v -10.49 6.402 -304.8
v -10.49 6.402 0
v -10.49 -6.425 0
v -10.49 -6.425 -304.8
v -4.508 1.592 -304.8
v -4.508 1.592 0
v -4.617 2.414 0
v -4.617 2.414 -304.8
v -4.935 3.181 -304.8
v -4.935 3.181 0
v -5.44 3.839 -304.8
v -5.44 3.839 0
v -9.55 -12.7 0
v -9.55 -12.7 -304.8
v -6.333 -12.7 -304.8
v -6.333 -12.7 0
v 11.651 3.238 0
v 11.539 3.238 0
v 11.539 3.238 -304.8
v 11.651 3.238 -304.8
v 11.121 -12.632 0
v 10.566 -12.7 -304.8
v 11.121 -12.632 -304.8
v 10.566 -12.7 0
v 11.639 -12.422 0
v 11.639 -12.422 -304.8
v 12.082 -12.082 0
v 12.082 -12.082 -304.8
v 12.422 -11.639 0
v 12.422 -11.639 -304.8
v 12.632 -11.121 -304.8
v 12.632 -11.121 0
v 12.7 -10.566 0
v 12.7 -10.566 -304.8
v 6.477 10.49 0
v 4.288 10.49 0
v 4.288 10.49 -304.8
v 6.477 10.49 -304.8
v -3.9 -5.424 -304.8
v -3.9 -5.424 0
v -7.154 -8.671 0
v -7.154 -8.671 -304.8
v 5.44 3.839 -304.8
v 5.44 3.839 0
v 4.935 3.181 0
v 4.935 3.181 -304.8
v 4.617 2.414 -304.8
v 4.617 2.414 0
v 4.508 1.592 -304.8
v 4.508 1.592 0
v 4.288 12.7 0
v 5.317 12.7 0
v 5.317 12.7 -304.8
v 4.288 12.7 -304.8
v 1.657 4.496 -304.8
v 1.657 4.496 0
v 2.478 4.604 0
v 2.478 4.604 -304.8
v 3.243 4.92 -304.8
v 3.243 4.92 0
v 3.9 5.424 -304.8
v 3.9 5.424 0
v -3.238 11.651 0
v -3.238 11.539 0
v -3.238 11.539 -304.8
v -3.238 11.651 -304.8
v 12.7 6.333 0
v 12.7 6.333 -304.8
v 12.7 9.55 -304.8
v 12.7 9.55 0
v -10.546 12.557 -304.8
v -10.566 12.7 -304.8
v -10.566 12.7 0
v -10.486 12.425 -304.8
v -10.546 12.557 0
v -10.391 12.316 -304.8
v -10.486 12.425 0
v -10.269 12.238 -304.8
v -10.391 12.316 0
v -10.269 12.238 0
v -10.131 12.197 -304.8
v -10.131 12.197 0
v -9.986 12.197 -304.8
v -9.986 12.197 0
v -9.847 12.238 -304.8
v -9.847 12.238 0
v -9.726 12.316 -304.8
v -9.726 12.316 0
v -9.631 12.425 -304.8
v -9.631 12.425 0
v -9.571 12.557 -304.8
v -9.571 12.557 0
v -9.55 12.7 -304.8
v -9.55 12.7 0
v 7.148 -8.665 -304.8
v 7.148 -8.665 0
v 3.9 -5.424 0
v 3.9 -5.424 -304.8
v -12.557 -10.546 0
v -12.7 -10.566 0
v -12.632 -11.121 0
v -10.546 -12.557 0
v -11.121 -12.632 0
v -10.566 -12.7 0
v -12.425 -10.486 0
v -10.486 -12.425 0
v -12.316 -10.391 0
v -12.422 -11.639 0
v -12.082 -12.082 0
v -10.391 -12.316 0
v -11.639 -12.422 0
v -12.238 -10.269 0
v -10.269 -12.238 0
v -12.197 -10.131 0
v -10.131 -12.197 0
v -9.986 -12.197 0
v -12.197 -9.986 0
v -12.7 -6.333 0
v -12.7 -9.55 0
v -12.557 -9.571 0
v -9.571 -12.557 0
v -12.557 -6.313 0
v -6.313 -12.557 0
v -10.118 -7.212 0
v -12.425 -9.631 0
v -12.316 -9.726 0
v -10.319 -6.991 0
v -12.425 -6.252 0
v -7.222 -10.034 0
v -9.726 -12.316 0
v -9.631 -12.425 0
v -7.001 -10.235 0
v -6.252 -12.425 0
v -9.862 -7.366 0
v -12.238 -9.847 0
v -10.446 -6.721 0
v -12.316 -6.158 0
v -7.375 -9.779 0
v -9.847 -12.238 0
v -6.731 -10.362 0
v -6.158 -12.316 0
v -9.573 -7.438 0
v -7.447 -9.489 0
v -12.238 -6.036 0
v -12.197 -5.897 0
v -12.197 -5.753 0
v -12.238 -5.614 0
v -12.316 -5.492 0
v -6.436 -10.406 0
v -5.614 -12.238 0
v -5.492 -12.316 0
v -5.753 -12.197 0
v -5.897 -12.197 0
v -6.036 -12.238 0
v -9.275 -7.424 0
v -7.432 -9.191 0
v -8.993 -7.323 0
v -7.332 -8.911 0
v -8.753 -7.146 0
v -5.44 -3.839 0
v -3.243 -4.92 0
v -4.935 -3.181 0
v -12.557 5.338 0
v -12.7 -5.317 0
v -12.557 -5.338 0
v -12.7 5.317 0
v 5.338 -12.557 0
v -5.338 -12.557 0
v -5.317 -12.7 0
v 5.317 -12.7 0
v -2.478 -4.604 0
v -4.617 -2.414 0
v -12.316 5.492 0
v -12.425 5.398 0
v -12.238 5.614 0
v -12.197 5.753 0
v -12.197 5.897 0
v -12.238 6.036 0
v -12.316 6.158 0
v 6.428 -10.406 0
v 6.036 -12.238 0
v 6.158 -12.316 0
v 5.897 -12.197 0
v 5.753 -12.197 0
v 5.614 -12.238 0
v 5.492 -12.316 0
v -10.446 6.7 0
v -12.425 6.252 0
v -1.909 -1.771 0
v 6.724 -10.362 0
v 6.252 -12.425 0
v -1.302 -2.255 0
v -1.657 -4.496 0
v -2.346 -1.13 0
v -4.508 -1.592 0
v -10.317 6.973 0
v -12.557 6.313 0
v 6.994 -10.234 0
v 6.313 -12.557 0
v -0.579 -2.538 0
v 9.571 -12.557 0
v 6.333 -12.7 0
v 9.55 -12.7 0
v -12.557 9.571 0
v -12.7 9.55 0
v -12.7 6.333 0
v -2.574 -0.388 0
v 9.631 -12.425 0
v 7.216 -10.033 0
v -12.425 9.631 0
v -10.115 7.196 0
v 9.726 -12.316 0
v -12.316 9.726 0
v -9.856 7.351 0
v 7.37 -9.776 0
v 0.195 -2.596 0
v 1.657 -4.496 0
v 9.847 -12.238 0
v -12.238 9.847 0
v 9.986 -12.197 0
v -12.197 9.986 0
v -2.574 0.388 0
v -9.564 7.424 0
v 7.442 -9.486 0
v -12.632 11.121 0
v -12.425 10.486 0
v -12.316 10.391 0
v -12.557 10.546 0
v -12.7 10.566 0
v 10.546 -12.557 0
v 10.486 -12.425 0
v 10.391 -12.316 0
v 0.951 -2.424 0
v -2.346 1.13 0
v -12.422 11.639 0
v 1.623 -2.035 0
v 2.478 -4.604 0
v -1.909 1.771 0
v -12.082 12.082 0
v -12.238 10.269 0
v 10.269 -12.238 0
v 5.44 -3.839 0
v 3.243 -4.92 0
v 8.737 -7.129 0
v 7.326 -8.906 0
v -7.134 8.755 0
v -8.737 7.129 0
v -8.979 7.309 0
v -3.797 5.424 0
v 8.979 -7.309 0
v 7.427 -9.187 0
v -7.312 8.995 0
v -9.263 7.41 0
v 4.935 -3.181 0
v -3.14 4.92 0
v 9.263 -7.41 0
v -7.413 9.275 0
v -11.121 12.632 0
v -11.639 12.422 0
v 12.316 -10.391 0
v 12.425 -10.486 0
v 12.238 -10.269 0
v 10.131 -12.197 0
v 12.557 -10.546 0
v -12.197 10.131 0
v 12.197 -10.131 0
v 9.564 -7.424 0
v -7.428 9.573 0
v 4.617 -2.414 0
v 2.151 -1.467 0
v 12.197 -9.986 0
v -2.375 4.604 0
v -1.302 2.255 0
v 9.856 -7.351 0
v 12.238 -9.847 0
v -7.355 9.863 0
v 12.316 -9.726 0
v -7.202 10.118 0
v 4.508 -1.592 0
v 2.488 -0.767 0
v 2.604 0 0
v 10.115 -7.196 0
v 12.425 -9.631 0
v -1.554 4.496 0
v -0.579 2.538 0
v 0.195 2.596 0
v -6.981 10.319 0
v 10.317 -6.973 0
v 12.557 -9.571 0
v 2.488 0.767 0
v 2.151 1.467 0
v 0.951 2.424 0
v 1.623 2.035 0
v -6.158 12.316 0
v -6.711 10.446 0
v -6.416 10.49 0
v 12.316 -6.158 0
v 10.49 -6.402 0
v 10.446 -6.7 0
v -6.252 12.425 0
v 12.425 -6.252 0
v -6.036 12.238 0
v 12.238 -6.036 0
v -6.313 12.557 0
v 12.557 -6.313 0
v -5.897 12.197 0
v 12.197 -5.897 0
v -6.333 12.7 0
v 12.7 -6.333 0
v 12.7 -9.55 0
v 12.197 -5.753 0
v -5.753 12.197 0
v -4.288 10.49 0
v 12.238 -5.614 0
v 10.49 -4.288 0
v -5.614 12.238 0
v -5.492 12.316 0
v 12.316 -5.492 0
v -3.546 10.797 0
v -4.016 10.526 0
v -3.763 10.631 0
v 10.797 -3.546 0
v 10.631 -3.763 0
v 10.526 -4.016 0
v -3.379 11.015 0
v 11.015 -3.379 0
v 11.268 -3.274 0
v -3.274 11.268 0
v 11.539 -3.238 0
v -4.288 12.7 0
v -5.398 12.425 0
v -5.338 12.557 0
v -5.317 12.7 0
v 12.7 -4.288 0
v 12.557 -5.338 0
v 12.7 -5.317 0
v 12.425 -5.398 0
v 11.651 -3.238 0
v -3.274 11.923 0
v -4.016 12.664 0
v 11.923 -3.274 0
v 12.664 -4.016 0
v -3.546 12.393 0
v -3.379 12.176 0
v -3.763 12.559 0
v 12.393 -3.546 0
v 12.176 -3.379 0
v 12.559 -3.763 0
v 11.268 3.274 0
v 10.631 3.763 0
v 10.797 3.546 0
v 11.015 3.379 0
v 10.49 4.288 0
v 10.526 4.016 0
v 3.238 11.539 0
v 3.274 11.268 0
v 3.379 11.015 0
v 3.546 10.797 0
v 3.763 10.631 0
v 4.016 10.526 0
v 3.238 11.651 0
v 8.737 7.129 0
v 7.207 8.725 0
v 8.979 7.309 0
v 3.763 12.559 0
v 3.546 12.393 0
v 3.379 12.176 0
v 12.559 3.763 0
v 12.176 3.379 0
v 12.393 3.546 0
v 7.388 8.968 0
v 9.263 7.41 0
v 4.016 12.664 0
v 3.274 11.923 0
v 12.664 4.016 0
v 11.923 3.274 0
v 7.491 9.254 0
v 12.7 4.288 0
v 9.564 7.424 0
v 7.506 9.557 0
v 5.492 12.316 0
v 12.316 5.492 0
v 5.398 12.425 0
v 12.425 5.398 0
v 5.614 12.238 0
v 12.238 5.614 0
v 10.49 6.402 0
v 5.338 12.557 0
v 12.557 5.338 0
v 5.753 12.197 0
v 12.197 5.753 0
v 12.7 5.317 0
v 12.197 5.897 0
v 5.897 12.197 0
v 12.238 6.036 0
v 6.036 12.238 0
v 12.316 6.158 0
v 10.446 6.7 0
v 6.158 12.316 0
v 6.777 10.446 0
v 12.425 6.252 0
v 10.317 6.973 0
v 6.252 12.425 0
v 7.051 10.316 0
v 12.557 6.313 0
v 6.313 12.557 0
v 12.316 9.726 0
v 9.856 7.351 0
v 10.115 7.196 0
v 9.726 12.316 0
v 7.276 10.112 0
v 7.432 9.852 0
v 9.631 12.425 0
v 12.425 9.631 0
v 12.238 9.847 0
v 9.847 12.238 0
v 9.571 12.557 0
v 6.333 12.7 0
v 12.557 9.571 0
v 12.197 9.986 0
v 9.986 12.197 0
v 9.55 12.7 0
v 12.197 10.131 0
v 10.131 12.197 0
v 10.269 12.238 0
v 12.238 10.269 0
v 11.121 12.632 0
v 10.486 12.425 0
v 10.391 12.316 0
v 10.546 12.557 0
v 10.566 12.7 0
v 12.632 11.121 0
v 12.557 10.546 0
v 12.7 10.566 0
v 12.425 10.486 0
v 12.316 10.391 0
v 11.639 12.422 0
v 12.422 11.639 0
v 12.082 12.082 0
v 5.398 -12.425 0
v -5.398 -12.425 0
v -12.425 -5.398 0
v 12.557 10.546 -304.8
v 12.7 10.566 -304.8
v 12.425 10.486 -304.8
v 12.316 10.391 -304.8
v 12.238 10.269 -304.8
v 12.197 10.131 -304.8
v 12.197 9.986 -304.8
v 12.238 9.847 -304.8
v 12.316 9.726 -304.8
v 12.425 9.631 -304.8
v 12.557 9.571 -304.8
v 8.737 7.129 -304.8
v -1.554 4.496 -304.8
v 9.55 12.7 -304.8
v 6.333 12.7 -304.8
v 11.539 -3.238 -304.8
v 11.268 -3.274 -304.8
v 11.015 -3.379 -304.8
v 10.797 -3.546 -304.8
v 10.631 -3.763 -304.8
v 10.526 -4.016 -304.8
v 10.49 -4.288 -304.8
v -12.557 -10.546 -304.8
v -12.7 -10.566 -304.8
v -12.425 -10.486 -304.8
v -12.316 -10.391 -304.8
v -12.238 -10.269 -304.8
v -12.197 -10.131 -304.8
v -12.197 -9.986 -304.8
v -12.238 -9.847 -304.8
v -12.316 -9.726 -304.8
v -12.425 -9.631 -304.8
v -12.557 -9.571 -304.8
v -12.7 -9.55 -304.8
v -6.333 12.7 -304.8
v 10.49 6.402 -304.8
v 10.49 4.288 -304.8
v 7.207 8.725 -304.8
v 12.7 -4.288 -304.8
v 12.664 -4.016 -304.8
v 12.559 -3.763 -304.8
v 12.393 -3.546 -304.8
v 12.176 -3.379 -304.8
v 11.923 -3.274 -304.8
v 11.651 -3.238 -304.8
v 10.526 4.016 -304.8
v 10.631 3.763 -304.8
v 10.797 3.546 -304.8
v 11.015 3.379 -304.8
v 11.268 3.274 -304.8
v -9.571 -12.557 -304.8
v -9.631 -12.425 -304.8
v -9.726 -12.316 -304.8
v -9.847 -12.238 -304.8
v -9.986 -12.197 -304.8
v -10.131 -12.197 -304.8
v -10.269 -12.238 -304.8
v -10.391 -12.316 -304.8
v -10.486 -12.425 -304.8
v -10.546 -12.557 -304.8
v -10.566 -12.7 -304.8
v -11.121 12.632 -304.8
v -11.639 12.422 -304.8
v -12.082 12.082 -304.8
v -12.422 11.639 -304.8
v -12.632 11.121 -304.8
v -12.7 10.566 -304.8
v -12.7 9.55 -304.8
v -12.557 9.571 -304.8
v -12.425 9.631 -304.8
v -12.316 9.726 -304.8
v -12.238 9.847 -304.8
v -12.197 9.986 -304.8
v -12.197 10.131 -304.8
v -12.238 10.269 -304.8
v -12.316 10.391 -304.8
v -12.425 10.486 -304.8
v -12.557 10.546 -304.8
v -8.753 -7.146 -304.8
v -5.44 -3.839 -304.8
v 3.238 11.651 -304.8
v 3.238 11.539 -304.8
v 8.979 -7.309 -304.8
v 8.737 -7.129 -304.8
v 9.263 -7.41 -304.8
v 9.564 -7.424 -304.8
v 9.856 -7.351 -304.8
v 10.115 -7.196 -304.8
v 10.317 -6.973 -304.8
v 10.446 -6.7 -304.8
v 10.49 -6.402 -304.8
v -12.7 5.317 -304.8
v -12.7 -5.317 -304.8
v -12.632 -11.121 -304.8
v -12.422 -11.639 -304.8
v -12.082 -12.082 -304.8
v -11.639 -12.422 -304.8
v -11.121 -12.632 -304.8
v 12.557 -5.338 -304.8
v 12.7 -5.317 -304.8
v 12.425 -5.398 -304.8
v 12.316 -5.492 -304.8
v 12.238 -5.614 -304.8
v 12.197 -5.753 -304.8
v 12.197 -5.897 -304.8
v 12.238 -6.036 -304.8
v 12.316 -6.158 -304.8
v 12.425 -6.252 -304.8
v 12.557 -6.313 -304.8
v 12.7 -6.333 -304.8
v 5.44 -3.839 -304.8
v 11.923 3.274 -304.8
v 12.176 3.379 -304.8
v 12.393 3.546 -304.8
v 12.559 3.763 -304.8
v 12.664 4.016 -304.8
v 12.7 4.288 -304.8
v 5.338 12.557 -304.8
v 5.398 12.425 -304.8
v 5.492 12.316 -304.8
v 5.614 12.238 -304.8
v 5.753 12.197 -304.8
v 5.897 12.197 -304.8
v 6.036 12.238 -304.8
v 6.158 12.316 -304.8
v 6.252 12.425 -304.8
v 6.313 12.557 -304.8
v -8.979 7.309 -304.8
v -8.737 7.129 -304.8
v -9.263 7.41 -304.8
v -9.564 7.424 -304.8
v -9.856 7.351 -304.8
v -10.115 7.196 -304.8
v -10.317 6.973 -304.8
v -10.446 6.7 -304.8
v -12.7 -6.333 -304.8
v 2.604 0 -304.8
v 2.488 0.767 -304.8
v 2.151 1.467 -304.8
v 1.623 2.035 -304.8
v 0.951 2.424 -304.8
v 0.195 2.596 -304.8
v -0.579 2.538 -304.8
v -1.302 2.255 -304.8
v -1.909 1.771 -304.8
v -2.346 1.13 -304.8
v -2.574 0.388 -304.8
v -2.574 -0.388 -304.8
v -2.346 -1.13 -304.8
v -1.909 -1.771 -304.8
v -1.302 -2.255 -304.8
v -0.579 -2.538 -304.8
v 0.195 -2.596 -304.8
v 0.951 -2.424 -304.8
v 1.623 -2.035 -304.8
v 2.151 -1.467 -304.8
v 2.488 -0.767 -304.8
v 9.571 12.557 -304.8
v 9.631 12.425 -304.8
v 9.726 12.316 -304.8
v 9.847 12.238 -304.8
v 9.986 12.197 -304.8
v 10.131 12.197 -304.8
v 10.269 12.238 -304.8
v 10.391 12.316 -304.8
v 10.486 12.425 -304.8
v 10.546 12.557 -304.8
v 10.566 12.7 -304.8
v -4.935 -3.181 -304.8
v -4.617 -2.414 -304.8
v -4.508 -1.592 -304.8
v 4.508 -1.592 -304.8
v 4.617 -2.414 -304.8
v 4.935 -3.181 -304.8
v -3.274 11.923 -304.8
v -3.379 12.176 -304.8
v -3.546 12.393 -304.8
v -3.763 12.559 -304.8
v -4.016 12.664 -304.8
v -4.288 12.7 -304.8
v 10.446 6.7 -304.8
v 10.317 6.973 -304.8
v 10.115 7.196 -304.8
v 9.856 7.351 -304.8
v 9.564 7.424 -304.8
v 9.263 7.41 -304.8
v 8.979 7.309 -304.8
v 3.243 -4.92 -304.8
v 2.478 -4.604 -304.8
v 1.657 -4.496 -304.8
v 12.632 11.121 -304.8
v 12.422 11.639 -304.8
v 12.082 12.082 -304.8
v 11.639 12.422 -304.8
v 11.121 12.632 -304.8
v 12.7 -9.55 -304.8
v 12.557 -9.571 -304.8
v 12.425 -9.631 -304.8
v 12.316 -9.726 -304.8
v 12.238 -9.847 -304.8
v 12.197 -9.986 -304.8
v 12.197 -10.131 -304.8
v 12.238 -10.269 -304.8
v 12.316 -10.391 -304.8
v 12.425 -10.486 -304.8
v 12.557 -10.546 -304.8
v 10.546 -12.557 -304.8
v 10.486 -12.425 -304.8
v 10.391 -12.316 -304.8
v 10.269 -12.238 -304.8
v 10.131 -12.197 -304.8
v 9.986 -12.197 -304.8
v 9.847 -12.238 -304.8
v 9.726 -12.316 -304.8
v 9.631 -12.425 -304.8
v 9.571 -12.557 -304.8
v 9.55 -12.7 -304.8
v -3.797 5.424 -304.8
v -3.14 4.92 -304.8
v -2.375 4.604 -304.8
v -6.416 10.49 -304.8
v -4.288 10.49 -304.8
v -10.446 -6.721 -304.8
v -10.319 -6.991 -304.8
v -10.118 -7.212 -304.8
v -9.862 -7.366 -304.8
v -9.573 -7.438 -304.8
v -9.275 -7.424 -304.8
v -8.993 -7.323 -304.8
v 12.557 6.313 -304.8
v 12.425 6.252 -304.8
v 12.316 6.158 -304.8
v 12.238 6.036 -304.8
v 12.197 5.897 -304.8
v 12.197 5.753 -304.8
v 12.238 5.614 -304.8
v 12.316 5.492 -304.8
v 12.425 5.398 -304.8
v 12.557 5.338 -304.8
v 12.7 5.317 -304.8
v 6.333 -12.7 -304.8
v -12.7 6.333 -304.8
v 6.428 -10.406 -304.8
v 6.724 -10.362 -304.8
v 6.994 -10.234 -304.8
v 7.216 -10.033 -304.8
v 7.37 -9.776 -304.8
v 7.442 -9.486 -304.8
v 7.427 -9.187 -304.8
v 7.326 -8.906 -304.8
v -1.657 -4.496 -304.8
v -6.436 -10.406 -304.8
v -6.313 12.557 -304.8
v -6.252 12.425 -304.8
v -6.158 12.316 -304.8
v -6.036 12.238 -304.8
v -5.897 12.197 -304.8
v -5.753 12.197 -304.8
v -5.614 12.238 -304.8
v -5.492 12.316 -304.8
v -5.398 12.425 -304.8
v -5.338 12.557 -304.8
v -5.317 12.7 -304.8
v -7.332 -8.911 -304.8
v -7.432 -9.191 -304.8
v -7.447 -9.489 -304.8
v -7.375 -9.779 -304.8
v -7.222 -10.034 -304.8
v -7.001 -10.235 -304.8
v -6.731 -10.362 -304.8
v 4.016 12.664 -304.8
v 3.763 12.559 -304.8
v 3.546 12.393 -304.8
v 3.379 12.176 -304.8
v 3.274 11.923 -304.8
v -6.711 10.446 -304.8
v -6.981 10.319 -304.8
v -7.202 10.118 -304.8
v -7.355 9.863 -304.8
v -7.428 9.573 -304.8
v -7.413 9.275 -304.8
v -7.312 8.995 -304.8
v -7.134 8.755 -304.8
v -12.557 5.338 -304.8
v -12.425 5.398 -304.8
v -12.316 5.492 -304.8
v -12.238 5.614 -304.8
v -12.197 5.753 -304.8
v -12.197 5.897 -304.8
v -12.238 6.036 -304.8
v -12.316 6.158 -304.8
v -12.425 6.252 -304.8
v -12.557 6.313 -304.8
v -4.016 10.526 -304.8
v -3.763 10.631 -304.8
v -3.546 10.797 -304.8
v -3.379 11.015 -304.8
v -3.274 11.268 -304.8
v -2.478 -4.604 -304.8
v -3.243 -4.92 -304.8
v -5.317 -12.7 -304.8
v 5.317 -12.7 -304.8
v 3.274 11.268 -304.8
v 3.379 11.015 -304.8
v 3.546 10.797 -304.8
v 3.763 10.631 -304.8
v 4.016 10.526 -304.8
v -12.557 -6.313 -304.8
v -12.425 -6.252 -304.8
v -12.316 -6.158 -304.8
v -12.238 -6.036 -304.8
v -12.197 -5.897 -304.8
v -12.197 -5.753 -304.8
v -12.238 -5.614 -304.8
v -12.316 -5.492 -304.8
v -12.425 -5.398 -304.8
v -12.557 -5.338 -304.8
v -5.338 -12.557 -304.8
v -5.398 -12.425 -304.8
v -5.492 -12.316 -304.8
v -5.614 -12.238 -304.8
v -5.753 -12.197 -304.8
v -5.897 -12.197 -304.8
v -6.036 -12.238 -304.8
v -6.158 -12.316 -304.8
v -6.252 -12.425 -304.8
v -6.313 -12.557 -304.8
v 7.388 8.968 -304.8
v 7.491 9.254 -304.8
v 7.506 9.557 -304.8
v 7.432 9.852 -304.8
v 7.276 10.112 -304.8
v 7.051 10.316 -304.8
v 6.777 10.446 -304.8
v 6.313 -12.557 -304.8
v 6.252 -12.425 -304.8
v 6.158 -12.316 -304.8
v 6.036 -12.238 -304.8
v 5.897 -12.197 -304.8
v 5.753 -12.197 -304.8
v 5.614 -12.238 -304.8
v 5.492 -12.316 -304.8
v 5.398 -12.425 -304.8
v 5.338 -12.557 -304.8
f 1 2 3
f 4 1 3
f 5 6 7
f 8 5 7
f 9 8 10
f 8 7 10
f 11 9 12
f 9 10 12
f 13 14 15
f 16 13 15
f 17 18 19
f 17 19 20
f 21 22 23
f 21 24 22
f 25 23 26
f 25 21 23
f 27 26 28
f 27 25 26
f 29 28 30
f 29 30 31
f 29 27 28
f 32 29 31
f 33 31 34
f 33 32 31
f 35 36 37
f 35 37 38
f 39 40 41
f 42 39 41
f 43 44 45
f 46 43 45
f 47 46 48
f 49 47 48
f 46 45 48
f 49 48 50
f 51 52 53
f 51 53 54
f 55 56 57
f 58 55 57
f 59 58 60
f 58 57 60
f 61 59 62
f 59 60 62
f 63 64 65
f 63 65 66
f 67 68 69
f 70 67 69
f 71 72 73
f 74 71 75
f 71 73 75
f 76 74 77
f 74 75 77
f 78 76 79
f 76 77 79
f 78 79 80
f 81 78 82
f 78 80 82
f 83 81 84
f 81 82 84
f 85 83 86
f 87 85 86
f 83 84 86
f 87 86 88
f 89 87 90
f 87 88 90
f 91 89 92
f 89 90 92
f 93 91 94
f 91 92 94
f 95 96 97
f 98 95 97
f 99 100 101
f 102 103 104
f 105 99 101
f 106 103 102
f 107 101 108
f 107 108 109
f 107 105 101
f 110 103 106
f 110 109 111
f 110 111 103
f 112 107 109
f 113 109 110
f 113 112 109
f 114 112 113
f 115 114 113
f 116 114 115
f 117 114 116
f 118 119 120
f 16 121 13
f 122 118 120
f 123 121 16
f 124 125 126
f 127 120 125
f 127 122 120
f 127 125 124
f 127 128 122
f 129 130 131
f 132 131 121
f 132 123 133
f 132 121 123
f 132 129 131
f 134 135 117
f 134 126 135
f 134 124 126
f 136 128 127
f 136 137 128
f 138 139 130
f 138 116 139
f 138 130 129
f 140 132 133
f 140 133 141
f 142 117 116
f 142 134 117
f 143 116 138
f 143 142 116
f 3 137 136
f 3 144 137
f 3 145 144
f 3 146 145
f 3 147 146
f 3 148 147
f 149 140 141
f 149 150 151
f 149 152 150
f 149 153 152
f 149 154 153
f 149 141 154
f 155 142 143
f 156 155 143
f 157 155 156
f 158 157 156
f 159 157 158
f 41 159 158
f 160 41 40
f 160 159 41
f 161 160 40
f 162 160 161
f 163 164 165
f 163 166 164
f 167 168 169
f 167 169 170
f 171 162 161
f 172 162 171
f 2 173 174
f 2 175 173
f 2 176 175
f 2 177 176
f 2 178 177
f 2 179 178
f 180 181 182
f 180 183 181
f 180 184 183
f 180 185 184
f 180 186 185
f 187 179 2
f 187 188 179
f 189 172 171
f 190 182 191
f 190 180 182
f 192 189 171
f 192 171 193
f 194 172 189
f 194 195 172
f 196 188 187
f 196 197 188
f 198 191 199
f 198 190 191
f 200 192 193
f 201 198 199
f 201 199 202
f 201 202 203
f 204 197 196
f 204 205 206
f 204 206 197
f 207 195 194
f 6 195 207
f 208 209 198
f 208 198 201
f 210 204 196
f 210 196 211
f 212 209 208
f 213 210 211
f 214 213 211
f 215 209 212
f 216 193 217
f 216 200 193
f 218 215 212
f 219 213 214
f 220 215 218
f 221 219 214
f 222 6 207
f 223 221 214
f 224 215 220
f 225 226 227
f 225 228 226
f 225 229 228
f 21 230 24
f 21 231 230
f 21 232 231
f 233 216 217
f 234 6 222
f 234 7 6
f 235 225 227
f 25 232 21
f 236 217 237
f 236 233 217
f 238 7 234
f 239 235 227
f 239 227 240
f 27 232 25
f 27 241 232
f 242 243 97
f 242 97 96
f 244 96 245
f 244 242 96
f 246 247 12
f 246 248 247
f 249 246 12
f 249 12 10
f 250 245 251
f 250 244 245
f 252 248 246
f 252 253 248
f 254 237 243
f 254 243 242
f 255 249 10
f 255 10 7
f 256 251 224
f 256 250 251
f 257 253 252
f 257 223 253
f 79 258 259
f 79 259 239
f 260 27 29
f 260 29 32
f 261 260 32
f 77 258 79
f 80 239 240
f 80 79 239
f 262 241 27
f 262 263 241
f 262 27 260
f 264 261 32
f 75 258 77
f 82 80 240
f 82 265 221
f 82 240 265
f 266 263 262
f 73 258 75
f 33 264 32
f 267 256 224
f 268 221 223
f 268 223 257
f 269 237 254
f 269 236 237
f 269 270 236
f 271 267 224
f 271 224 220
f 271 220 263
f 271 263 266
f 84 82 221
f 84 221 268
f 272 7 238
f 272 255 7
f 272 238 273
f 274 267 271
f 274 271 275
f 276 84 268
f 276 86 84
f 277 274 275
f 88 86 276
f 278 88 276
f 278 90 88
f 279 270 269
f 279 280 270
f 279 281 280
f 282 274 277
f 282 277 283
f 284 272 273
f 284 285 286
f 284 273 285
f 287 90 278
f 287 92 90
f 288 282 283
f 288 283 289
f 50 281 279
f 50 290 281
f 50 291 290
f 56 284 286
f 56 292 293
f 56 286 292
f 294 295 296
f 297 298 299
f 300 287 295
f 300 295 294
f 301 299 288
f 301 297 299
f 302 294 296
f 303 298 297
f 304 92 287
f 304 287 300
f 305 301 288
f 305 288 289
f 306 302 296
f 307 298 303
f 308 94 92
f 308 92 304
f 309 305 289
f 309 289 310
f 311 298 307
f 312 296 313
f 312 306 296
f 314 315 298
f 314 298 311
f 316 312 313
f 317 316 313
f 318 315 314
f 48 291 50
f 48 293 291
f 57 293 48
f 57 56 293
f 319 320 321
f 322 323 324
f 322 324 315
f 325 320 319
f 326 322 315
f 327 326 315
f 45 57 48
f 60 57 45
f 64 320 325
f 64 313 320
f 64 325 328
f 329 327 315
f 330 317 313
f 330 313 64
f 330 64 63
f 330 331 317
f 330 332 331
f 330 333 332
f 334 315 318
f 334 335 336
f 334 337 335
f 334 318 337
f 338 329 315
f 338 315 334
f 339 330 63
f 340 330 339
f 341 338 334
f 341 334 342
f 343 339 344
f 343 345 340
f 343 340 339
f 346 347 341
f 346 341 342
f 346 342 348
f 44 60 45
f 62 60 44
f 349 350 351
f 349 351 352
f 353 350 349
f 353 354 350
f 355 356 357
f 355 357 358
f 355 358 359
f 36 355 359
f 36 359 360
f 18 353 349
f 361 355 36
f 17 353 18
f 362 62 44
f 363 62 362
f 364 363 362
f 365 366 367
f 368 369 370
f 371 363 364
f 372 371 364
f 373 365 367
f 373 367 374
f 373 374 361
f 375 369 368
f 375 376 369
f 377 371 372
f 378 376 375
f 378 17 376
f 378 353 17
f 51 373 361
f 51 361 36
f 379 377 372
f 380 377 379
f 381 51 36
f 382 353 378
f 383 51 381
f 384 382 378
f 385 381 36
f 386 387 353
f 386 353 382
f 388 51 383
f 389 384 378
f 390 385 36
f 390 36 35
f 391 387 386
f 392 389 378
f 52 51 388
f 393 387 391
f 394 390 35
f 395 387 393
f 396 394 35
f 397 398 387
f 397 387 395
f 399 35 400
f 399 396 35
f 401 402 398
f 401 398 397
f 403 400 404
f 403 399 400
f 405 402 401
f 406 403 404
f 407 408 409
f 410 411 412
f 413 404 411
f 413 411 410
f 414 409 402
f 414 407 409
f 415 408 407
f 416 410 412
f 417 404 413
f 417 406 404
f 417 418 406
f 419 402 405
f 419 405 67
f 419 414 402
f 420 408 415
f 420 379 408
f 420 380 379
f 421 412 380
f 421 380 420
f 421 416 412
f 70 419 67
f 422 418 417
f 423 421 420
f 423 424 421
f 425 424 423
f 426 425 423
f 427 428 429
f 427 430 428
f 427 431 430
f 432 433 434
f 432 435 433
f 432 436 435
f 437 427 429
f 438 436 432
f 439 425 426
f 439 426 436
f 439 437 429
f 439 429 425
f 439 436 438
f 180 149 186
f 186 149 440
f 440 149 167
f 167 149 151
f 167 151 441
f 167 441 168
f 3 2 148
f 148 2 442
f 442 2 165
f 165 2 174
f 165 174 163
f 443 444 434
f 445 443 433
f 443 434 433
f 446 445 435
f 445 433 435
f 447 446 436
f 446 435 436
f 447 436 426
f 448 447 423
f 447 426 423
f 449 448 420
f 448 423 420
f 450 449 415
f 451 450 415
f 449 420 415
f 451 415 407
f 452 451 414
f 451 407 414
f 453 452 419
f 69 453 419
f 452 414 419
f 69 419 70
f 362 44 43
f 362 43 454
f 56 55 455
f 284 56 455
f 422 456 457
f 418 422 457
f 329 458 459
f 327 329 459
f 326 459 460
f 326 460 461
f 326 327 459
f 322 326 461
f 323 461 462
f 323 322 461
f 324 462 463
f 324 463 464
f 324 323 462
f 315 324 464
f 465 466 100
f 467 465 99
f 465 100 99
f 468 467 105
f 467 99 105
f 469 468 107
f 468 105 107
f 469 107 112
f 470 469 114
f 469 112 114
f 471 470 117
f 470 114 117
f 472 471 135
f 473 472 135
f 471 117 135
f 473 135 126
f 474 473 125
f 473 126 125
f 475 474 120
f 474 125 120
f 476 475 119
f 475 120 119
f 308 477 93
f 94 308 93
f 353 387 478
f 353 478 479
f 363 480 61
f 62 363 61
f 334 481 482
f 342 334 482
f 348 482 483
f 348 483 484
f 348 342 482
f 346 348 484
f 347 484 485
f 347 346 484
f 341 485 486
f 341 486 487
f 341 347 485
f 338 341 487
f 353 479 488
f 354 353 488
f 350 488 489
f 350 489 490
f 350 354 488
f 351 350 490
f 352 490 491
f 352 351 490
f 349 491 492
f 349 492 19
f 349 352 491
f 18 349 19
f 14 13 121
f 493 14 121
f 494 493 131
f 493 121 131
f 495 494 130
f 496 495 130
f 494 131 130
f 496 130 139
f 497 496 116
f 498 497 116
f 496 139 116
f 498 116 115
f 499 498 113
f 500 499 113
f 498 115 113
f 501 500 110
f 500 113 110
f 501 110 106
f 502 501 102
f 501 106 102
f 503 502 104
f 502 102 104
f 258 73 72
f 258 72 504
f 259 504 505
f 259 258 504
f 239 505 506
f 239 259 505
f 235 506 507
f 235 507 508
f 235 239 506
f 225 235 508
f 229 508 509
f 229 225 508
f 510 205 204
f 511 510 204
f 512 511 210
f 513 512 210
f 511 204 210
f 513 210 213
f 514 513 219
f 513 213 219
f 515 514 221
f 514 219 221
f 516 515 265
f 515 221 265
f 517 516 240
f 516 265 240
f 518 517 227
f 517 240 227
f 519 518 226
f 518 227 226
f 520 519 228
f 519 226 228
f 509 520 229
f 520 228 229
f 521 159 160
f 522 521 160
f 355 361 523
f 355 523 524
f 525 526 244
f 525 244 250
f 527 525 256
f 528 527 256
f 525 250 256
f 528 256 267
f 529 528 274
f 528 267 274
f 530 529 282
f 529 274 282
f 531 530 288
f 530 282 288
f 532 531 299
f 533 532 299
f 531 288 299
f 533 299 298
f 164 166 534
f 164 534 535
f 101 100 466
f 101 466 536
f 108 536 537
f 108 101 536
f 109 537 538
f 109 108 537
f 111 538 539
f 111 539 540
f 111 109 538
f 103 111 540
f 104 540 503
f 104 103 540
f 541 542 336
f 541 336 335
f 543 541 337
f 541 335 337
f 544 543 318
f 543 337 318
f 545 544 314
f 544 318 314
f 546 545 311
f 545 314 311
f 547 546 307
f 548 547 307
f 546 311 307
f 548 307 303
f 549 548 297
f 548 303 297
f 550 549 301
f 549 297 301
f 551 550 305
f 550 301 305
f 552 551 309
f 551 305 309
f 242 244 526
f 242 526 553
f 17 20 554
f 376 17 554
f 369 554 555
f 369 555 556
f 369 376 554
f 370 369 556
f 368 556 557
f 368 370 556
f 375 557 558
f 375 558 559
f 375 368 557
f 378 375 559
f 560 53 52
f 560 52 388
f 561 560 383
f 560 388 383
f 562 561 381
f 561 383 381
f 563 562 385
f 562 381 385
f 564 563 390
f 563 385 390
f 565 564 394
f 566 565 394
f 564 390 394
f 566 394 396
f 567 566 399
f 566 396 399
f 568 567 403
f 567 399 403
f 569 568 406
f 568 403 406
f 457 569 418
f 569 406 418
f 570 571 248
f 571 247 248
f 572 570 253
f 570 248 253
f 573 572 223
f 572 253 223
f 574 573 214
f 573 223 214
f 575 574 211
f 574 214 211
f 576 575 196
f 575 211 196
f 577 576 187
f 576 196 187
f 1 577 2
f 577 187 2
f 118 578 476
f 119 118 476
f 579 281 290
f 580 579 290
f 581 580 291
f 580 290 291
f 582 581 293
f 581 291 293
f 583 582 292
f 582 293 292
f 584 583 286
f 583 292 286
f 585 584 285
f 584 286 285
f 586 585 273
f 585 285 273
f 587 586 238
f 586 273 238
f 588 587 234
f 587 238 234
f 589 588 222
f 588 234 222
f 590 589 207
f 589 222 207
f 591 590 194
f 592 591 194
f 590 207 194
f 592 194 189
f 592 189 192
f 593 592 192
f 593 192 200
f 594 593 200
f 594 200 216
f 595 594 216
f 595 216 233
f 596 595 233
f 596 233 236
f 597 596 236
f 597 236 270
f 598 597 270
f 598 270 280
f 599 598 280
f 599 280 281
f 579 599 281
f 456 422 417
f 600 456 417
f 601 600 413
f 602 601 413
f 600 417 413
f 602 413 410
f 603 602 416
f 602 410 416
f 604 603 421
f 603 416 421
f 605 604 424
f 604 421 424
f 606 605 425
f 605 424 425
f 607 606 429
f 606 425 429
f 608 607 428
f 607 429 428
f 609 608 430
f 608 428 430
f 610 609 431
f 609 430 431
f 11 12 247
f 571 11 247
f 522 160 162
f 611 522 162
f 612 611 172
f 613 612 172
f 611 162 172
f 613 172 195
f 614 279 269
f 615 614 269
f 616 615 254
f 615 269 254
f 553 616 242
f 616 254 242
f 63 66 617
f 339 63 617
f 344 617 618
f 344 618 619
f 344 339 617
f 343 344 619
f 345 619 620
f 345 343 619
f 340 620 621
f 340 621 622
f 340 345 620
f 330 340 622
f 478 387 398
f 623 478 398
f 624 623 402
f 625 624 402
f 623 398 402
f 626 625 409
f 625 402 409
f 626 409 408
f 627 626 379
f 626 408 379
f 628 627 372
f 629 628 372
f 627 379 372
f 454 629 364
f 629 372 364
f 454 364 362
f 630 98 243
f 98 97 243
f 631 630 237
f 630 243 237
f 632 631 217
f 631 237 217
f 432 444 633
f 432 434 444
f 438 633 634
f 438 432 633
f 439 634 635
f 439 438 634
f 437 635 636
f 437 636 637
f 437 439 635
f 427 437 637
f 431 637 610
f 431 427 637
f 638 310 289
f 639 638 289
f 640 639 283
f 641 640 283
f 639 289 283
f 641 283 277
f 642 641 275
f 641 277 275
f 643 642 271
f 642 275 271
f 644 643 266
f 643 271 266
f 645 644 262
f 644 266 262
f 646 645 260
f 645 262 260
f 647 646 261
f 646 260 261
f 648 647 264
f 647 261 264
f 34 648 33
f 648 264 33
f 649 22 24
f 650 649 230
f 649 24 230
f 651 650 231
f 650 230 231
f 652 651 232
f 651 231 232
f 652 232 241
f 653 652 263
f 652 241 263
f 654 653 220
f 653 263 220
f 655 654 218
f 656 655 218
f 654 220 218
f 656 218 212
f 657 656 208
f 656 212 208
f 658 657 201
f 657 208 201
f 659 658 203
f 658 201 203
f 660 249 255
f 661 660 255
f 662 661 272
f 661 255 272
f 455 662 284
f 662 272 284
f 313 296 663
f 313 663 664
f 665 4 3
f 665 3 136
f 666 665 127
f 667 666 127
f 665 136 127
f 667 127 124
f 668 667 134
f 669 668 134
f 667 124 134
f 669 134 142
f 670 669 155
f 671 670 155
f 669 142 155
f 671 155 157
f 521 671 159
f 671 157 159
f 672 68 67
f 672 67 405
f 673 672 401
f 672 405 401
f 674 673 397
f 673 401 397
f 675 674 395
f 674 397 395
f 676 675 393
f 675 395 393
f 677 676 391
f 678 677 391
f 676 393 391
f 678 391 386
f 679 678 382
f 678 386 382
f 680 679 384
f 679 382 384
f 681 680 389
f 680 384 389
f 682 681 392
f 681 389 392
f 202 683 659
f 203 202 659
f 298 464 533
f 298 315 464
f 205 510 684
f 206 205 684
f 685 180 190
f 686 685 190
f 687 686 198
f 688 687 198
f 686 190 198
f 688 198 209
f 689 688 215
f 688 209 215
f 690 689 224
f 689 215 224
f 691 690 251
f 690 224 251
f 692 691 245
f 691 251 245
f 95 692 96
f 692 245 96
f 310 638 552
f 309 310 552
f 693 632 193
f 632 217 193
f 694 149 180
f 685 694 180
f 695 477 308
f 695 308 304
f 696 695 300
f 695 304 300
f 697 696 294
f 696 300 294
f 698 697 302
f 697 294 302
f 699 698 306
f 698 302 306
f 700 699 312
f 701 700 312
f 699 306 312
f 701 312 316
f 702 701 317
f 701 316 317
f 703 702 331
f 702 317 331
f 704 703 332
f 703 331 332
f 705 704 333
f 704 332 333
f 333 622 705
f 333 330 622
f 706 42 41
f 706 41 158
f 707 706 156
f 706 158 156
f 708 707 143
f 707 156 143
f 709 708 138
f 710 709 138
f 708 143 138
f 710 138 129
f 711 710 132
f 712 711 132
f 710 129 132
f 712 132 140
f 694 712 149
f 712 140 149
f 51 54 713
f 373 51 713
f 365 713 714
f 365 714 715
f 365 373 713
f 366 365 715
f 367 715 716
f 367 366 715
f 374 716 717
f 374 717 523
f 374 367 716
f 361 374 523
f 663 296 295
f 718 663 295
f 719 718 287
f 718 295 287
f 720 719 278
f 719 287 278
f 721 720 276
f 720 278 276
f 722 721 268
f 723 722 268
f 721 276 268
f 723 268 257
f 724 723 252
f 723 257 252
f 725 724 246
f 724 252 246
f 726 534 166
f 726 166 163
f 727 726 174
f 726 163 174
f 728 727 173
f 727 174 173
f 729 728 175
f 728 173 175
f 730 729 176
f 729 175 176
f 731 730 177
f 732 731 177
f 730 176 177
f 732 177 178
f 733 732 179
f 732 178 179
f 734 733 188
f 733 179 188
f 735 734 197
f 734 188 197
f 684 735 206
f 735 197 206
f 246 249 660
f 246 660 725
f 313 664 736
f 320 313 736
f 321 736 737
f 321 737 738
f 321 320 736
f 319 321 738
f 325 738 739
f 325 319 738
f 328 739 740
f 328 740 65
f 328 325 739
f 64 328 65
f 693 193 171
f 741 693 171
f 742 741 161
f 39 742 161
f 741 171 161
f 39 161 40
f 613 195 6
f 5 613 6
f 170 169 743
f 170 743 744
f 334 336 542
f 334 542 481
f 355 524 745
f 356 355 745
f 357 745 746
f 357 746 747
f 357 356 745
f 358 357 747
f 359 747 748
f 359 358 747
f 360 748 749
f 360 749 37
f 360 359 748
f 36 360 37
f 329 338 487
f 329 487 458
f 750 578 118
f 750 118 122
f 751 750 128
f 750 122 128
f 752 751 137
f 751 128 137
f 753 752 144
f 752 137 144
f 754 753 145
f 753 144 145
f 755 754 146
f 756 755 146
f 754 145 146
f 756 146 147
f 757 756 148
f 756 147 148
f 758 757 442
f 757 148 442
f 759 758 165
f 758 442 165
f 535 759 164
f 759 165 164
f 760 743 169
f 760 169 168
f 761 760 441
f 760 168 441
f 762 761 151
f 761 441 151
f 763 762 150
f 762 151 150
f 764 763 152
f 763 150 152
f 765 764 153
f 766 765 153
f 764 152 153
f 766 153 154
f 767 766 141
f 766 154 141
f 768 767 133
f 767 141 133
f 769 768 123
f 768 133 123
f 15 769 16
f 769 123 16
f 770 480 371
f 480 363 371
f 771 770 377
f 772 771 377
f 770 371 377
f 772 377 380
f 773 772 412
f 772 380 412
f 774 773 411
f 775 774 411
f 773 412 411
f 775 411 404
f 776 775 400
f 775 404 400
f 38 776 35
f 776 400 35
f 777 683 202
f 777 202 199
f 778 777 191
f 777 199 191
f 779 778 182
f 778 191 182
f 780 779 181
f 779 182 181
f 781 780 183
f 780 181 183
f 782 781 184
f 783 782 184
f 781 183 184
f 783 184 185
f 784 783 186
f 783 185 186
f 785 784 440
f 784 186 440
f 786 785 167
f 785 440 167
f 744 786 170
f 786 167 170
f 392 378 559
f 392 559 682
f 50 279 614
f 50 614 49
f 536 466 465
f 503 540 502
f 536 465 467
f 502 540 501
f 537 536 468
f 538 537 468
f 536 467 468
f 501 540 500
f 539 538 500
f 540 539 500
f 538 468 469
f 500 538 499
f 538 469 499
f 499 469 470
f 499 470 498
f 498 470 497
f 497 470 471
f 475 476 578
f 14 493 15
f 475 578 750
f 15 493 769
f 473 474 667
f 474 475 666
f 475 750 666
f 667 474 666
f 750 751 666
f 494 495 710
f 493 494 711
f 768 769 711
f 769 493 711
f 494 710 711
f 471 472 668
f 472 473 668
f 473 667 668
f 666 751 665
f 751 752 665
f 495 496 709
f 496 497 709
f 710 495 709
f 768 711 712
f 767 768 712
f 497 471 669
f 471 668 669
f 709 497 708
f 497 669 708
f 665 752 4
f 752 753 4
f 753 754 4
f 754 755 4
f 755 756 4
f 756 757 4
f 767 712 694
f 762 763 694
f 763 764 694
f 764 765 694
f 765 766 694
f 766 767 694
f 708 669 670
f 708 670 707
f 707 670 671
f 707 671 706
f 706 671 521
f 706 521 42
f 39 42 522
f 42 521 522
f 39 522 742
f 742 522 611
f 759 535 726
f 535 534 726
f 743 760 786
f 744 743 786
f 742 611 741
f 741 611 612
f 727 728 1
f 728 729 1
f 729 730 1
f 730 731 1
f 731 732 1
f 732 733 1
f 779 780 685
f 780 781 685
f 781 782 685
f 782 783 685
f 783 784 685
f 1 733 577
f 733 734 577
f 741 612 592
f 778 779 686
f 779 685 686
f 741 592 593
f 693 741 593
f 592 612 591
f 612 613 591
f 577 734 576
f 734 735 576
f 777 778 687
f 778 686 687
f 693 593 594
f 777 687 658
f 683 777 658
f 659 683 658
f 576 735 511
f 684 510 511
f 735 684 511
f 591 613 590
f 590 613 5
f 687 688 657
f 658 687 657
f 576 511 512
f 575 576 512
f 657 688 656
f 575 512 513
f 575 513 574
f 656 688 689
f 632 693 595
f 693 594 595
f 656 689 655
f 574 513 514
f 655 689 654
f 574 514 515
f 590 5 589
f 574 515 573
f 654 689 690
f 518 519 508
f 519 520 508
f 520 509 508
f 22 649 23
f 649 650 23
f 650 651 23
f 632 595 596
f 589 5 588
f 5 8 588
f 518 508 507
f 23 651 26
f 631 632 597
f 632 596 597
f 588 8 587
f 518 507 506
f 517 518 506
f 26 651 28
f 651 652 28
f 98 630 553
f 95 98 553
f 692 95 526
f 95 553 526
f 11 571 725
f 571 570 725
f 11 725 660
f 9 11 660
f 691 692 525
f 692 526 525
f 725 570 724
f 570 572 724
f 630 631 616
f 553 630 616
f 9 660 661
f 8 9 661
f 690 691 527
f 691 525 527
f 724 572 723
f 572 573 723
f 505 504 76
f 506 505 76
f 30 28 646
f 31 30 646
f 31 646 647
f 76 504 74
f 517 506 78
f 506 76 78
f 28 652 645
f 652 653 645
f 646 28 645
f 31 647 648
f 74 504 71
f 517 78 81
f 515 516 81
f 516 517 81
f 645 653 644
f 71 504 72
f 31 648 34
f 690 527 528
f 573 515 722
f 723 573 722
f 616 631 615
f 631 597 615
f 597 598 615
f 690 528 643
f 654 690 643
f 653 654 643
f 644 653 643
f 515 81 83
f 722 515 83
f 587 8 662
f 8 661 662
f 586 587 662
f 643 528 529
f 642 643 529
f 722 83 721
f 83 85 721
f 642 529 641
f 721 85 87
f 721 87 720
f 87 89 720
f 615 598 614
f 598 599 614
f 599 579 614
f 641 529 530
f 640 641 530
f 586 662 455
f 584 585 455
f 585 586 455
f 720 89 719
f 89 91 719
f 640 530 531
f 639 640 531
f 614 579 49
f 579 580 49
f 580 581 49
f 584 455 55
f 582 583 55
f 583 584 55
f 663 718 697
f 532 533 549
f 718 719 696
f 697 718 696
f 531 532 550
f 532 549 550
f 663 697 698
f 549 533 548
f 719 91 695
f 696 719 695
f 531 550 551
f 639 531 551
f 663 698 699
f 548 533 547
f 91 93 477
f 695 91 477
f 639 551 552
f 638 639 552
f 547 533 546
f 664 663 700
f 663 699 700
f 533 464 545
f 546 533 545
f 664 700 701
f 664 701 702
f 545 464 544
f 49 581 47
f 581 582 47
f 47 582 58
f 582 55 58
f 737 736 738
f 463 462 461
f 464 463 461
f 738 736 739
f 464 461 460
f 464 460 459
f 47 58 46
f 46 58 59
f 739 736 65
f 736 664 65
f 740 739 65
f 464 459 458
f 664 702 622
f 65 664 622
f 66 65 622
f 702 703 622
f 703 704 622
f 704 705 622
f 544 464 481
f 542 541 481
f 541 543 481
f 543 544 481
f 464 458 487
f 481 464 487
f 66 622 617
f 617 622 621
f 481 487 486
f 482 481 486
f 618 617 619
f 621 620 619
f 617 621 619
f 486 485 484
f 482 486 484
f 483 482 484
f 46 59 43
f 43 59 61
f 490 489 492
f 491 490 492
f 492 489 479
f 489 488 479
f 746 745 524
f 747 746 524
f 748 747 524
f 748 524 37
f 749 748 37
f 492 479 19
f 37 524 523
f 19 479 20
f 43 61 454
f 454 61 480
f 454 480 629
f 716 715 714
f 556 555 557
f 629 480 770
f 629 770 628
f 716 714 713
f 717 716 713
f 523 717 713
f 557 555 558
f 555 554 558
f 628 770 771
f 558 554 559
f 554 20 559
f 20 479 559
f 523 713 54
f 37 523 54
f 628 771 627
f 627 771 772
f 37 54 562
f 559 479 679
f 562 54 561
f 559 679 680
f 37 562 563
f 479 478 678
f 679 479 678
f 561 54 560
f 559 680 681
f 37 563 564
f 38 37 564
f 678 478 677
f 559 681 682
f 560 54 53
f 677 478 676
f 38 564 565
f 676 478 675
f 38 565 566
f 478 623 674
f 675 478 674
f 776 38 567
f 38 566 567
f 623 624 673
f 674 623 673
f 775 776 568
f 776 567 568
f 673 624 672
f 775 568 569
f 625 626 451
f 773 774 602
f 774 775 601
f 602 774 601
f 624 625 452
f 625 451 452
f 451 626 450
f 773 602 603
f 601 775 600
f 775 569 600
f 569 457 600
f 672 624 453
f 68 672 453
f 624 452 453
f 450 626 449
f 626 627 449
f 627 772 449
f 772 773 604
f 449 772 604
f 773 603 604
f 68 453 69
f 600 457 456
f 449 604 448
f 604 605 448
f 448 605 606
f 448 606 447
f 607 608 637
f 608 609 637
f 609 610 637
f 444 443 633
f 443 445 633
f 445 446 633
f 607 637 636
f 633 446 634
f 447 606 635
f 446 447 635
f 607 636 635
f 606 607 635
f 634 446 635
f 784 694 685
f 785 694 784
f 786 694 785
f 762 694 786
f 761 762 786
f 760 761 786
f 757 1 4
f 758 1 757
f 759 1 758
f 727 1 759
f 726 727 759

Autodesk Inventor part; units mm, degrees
ref_plane "YZ Plane" through (0, 0, 0) normal (1, 0, 0) x (0, 1, 0)
ref_plane "XZ Plane" through (0, 0, 0) normal (0, 1, 0) x (-1, 0, 0)
ref_plane "XY Plane" through (0, 0, 0) normal (0, 0, 1) x (1, 0, 0)
sketch "Sketch1" plane through (0, 0, 0) normal (0, 0, 1) x (1, 0, 0)
  circle A0 centre (0, 0) radius 2.6035
  arc A1 (-8.737, 7.1292) -> (-10.4902, 6.4021) centre (-9.4628, 6.4021) ccw
  line L0 (-5.4405, 3.8388) -> (-8.737, 7.1292)
  arc A2 (-4.5085, 1.5917) -> (-5.4405, 3.8388) centre (-7.6835, 1.5917) ccw
  line L1 (-4.5085, -1.5917) -> (-4.5085, 1.5917)
  arc A3 (-5.4405, -3.8388) -> (-4.5085, -1.5917) centre (-7.6835, -1.5917) ccw
  line L2 (-8.7534, -7.1457) -> (-5.4405, -3.8388)
  arc A4 (-10.4902, -6.4254) -> (-8.7534, -7.1457) centre (-9.4724, -6.4254) ccw
  line L3 (-10.4902, 6.4021) -> (-10.4902, -6.4254)
  arc A5 (-7.1537, -8.6712) -> (-6.436, -10.4062) centre (-6.436, -9.3902) ccw
  line L4 (-3.9003, -5.4237) -> (-7.1537, -8.6712)
  arc A6 (-1.6573, -4.4958) -> (-3.9003, -5.4237) centre (-1.6573, -7.6708) ccw
  line L5 (1.6573, -4.4958) -> (-1.6573, -4.4958)
  arc A7 (3.9003, -5.4237) -> (1.6573, -4.4958) centre (1.6573, -7.6708) ccw
  line L6 (7.1478, -8.6653) -> (3.9003, -5.4237)
  arc A8 (6.4276, -10.4062) -> (7.1478, -8.6653) centre (6.4276, -9.3868) ccw
  line L7 (-6.436, -10.4062) -> (6.4276, -10.4062)
  arc A9 (6.3331, -12.7) -> (5.3171, -12.7) centre (5.8251, -12.7) ccw
  line L8 (6.3331, -12.7) -> (9.5504, -12.7)
  arc A10 (10.5664, -12.6998) -> (9.5504, -12.7) centre (10.0584, -12.7) ccw
  arc A11 (10.5664, -12.6998) -> (12.6998, -10.5664) centre (10.5918, -10.5918) ccw
  arc A12 (12.7, -9.5504) -> (12.6998, -10.5664) centre (12.7, -10.0584) ccw
  line L9 (12.7, -9.5504) -> (12.7, -6.3331)
  arc A13 (12.7, -5.3171) -> (12.7, -6.3331) centre (12.7, -5.8251) ccw
  line L10 (12.7, -5.3171) -> (12.7, -4.2875)
  arc A14 (12.7, -4.2875) -> (11.651, -3.2385) centre (11.651, -4.2875) ccw
  line L11 (11.651, -3.2385) -> (11.5392, -3.2385)
  arc A15 (11.5392, -3.2385) -> (10.4902, -4.2875) centre (11.5392, -4.2875) ccw
  line L12 (10.4902, -4.2875) -> (10.4902, -6.4021)
  arc A16 (8.737, -7.1292) -> (10.4902, -6.4021) centre (9.4628, -6.4021) ccw
  line L13 (8.737, -7.1292) -> (5.4405, -3.8388)
  arc A17 (4.5085, -1.5917) -> (5.4405, -3.8388) centre (7.6835, -1.5917) ccw
  line L14 (4.5085, -1.5917) -> (4.5085, 1.5917)
  arc A18 (5.4405, 3.8388) -> (4.5085, 1.5917) centre (7.6835, 1.5917) ccw
  line L15 (5.4405, 3.8388) -> (8.737, 7.1292)
  arc A19 (10.4902, 6.4021) -> (8.737, 7.1292) centre (9.4628, 6.4021) ccw
  line L16 (10.4902, 6.4021) -> (10.4902, 4.2875)
  arc A20 (10.4902, 4.2875) -> (11.5392, 3.2385) centre (11.5392, 4.2875) ccw
  line L17 (11.5392, 3.2385) -> (11.651, 3.2385)
  arc A21 (11.651, 3.2385) -> (12.7, 4.2875) centre (11.651, 4.2875) ccw
  line L18 (12.7, 4.2875) -> (12.7, 5.3171)
  arc A22 (12.7, 6.3331) -> (12.7, 5.3171) centre (12.7, 5.8251) ccw
  line L19 (12.7, 6.3331) -> (12.7, 9.5504)
  arc A23 (12.6998, 10.5664) -> (12.7, 9.5504) centre (12.7, 10.0584) ccw
  arc A24 (12.6998, 10.5664) -> (10.5664, 12.6998) centre (10.5918, 10.5918) ccw
  arc A25 (9.5504, 12.7) -> (10.5664, 12.6998) centre (10.0584, 12.7) ccw
  line L20 (9.5504, 12.7) -> (6.3331, 12.7)
  arc A26 (5.3171, 12.7) -> (6.3331, 12.7) centre (5.8251, 12.7) ccw
  line L21 (5.3171, 12.7) -> (4.2875, 12.7)
  arc A27 (4.2875, 12.7) -> (3.2385, 11.651) centre (4.2875, 11.651) ccw
  line L22 (3.2385, 11.651) -> (3.2385, 11.5392)
  arc A28 (3.2385, 11.5392) -> (4.2875, 10.4902) centre (4.2875, 11.5392) ccw
  line L23 (4.2875, 10.4902) -> (6.4768, 10.4902)
  arc A29 (7.2072, 8.7246) -> (6.4768, 10.4902) centre (6.4768, 9.4563) ccw
  line L24 (7.2072, 8.7246) -> (3.9003, 5.4237)
  arc A30 (1.6573, 4.4958) -> (3.9003, 5.4237) centre (1.6573, 7.6708) ccw
  line L25 (1.6573, 4.4958) -> (-1.5537, 4.4958)
  arc A31 (-3.7967, 5.4237) -> (-1.5537, 4.4958) centre (-1.5537, 7.6708) ccw
  line L26 (-3.7967, 5.4237) -> (-7.1342, 8.7551)
  arc A32 (-6.4164, 10.4902) -> (-7.1342, 8.7551) centre (-6.4164, 9.4742) ccw
  line L27 (-6.4164, 10.4902) -> (-4.2875, 10.4902)
  arc A33 (-4.2875, 10.4902) -> (-3.2385, 11.5392) centre (-4.2875, 11.5392) ccw
  line L28 (-3.2385, 11.5392) -> (-3.2385, 11.651)
  arc A34 (-3.2385, 11.651) -> (-4.2875, 12.7) centre (-4.2875, 11.651) ccw
  line L29 (-4.2875, 12.7) -> (-5.3171, 12.7)
  arc A35 (-6.3331, 12.7) -> (-5.3171, 12.7) centre (-5.8251, 12.7) ccw
  line L30 (-6.3331, 12.7) -> (-9.5504, 12.7)
  arc A36 (-10.5664, 12.6998) -> (-9.5504, 12.7) centre (-10.0584, 12.7) ccw
  arc A37 (-10.5664, 12.6998) -> (-12.6998, 10.5664) centre (-10.5918, 10.5918) ccw
  arc A38 (-12.7, 9.5504) -> (-12.6998, 10.5664) centre (-12.7, 10.0584) ccw
  line L31 (-12.7, 9.5504) -> (-12.7, 6.3331)
  arc A39 (-12.7, 5.3171) -> (-12.7, 6.3331) centre (-12.7, 5.8251) ccw
  line L32 (-12.7, 5.3171) -> (-12.7, -5.3171)
  arc A40 (-12.7, -6.3331) -> (-12.7, -5.3171) centre (-12.7, -5.8251) ccw
  line L33 (-12.7, -6.3331) -> (-12.7, -9.5504)
  arc A41 (-12.6998, -10.5664) -> (-12.7, -9.5504) centre (-12.7, -10.0584) ccw
  arc A42 (-12.6998, -10.5664) -> (-10.5664, -12.6998) centre (-10.5918, -10.5918) ccw
  arc A43 (-9.5504, -12.7) -> (-10.5664, -12.6998) centre (-10.0584, -12.7) ccw
  line L34 (-9.5504, -12.7) -> (-6.3331, -12.7)
  arc A44 (-5.3171, -12.7) -> (-6.3331, -12.7) centre (-5.8251, -12.7) ccw
  line L35 (-5.3171, -12.7) -> (5.3171, -12.7)
extrude "Extrusion1" add sketch "Sketch1" against normal blind 304.8
properties part number "1002"
